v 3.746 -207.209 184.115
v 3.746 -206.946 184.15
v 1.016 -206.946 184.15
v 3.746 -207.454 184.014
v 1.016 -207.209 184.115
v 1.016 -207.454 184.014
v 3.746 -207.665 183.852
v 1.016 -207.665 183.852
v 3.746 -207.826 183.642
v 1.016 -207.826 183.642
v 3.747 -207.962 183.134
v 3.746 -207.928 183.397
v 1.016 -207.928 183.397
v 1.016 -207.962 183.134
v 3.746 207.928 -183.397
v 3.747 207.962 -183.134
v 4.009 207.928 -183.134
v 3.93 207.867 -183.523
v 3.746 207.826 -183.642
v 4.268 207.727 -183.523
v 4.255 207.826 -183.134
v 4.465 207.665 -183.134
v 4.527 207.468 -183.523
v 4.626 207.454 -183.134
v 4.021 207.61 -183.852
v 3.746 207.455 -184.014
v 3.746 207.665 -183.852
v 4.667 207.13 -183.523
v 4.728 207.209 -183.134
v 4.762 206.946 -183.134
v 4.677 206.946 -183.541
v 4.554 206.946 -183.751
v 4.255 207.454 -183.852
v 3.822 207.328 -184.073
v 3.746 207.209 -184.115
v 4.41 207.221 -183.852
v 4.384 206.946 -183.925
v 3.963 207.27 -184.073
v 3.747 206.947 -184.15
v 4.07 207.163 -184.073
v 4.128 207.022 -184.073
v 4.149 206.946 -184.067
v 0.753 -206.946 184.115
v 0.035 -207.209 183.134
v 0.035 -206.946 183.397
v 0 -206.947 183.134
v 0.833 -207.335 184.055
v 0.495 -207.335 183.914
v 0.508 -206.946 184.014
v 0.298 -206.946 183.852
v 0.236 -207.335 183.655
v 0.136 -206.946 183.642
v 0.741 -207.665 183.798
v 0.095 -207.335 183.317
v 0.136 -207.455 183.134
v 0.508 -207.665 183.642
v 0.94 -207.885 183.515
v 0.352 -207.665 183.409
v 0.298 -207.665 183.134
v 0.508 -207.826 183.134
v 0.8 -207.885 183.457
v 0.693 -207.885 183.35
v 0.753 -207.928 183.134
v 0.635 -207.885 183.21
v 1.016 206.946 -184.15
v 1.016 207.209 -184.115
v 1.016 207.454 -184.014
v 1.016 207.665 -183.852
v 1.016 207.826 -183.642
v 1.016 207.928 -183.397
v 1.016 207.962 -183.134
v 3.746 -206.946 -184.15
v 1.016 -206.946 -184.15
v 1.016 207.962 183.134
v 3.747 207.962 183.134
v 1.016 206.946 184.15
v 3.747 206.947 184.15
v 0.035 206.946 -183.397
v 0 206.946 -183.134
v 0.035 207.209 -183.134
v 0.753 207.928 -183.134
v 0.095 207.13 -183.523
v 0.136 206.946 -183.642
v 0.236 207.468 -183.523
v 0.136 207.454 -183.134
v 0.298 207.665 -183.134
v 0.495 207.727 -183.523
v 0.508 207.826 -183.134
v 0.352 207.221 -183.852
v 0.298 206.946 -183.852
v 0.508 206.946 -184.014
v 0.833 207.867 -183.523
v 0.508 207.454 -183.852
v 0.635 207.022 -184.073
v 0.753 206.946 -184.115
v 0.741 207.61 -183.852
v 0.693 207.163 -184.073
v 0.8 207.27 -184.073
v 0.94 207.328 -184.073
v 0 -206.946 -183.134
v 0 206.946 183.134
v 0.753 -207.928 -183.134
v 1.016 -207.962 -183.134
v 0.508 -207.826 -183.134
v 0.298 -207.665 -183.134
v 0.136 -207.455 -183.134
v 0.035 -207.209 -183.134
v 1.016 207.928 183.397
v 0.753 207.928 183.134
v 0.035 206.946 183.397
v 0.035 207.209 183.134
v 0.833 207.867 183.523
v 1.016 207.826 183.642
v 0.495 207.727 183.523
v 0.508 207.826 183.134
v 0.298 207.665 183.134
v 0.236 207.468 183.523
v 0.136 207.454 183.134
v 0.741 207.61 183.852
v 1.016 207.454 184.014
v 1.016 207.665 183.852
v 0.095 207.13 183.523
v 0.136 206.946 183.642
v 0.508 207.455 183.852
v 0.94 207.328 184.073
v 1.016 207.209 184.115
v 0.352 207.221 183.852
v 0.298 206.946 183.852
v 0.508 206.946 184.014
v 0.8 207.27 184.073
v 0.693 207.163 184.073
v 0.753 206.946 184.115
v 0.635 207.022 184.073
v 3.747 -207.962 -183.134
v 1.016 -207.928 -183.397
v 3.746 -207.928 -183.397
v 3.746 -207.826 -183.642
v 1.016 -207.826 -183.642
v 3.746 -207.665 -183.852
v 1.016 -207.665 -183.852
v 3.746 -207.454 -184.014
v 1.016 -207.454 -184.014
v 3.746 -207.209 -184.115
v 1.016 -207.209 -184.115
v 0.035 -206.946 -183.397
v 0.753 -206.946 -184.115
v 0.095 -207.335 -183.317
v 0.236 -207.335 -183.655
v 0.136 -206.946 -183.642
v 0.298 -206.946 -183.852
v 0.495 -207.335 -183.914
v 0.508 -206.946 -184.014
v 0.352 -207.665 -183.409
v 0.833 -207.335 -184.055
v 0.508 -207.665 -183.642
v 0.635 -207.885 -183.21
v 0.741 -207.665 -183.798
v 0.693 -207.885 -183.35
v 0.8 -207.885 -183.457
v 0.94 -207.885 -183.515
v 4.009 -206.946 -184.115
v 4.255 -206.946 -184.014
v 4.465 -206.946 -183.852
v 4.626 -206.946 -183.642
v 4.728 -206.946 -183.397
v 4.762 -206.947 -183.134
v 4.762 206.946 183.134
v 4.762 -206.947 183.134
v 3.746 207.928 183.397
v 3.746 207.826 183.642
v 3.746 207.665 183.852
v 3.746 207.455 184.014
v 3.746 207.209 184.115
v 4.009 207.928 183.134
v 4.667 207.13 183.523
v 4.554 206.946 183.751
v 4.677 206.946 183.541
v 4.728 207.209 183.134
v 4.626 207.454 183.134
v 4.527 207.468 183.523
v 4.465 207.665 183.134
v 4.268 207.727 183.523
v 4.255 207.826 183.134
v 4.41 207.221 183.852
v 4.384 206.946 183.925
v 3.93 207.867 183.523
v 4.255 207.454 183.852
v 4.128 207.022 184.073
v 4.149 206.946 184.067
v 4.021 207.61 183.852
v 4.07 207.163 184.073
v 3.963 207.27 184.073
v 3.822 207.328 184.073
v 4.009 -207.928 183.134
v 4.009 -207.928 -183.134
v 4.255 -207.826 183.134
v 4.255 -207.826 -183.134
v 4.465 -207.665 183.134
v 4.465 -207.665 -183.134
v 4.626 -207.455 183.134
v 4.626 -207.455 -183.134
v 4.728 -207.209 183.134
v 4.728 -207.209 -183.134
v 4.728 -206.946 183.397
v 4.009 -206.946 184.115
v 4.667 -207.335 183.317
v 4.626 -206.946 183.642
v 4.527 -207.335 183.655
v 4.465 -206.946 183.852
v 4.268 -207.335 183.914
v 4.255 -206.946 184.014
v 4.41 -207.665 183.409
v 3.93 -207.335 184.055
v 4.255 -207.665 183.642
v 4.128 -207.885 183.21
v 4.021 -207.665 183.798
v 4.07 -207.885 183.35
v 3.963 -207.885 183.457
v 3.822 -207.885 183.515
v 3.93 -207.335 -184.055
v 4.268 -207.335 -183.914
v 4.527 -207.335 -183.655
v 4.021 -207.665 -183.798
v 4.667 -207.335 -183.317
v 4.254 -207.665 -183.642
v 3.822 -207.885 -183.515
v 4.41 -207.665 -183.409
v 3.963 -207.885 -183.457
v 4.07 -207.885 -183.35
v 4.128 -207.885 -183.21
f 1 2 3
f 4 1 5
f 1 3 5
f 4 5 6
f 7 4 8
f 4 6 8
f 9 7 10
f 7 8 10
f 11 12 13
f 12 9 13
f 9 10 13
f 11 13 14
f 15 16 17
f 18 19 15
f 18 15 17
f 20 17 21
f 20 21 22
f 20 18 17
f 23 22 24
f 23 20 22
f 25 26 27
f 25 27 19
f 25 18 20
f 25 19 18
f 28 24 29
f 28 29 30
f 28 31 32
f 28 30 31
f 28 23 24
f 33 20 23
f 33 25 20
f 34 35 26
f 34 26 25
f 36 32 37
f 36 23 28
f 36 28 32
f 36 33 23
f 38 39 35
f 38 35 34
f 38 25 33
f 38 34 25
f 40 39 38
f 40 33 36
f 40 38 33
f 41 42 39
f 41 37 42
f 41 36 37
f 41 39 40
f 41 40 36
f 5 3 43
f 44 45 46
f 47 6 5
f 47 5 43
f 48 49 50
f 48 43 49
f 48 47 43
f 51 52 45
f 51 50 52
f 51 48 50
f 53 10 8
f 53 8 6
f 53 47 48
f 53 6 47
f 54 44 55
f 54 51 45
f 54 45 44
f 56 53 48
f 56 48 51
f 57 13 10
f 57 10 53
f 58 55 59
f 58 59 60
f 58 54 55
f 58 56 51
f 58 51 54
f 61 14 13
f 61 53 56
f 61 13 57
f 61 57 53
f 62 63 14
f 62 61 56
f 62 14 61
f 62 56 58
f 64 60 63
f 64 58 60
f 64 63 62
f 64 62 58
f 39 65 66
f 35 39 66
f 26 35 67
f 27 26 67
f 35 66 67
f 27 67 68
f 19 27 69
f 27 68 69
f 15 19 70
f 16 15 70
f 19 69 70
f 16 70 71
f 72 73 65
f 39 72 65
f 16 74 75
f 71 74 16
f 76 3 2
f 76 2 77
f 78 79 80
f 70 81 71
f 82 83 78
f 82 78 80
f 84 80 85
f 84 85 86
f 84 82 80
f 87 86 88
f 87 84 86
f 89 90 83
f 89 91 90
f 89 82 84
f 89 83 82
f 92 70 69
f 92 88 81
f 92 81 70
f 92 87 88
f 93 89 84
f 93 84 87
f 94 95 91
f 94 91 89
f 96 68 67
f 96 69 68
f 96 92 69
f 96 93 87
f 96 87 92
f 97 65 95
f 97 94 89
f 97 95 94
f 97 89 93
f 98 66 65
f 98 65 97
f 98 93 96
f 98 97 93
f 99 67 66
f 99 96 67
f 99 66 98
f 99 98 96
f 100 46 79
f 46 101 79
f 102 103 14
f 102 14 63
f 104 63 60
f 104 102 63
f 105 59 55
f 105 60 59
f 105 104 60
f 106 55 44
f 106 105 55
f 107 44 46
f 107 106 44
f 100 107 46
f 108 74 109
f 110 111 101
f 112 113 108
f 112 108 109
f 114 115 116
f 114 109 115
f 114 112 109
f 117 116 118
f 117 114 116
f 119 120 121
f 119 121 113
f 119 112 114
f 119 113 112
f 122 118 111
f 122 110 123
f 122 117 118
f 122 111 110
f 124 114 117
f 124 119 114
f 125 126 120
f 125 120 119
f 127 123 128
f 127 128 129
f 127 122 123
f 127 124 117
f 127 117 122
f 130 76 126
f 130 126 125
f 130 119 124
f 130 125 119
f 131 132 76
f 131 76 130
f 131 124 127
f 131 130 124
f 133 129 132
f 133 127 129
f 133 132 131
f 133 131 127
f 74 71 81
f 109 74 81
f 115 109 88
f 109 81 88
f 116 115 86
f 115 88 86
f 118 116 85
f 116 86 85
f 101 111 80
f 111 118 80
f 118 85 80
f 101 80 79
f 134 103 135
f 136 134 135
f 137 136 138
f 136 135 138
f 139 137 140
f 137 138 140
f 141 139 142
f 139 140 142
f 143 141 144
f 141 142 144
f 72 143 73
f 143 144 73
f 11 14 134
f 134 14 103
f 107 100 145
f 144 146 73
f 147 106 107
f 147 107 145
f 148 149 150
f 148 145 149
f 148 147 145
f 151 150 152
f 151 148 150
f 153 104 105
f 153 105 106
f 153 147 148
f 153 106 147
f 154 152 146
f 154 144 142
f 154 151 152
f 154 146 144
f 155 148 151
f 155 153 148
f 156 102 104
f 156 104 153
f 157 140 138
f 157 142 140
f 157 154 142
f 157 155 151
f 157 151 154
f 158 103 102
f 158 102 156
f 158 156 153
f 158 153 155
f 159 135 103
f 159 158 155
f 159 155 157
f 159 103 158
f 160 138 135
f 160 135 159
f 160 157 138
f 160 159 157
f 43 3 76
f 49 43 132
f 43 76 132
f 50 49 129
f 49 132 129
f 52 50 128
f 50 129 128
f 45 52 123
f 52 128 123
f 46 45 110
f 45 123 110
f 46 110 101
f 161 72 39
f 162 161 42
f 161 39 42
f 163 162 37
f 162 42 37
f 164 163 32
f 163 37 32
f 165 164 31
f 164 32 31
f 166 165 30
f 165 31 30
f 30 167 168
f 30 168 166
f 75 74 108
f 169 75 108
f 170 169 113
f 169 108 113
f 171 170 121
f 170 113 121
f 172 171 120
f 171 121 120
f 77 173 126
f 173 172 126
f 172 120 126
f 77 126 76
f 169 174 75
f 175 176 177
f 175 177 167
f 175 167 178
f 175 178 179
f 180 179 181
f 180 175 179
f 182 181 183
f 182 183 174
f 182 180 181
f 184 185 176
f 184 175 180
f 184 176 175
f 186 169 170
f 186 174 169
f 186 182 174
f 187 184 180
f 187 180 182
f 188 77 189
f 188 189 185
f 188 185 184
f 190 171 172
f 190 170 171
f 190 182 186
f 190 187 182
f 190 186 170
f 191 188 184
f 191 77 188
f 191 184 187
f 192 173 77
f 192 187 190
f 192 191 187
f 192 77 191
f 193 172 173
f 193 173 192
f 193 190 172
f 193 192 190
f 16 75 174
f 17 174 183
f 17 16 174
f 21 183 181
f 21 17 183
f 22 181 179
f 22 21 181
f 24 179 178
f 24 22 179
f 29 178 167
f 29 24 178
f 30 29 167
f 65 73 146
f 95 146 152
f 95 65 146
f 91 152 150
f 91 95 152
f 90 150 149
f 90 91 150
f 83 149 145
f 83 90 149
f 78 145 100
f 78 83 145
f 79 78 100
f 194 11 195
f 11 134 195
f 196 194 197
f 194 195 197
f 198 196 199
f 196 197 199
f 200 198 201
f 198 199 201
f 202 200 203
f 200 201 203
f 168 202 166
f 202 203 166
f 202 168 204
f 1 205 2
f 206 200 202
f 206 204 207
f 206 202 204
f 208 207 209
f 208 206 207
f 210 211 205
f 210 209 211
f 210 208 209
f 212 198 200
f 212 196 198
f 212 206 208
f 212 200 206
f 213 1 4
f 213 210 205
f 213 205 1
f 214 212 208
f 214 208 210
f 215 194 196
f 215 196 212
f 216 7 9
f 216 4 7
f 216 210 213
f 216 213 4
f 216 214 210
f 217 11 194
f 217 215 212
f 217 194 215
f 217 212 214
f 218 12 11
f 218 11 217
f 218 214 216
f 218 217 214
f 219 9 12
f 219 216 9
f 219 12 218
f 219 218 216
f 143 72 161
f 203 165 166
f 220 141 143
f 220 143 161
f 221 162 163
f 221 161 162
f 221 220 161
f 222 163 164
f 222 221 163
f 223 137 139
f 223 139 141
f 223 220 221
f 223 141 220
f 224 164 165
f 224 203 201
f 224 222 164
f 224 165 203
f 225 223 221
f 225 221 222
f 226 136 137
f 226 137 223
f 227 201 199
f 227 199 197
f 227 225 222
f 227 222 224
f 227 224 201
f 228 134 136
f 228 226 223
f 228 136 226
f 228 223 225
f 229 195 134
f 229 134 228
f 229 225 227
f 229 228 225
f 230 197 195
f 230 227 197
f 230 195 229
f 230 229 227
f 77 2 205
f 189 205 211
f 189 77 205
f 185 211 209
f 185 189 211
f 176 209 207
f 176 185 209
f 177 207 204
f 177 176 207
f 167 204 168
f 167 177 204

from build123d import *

# Parameters (mm, degrees)
SKETCH1_W           = 368.3
SKETCH1_H           = 415.925
BOSS_EXTRUDE1_DEPTH = 4.7625
FILLET1_R           = 1.016
FILLET2_R           = 1.016


with BuildPart() as part:
    # Sketch1 → Boss-Extrude1 (new body)
    with BuildSketch(Plane(origin=(0, 0, 0), x_dir=(0, 0, -1), z_dir=(1, 0, 0))):
        Rectangle(SKETCH1_W, SKETCH1_H)
    extrude(amount=BOSS_EXTRUDE1_DEPTH)

    # Fillet1
    fillet1_edges = [part.edges().sort_by_distance(p)[0] for p in [
        (4.7625, 0, 184.15),
        (4.7625, -207.9625, 0),
        (4.7625, 0, -184.15),
        (0, -207.9625, 0),
        (0, 0, 184.15),
        (0, 207.9625, 0),
        (0, 0, -184.15),
        (4.7625, 207.9625, 0),
    ]]
    fillet(fillet1_edges, radius=FILLET1_R)

    # Fillet2
    # the kernel refuses this fillet: 1.016 mm, written as the material it takes off along each edge
    with BuildSketch(Plane(origin=(1.016, -206.9465, -183.134), x_dir=(0, 0, -1), z_dir=(0, -1, 0))) as fillet2_piece_1_section:
        Polygon((0, 0), (FILLET2_R, 0), (FILLET2_R, -FILLET2_R), (0, -FILLET2_R), align=None)
    fillet2_piece_1 = extrude(amount=FILLET2_R, mode=Mode.PRIVATE)
    fillet2_piece_1 = fillet2_piece_1 - Plane(origin=(1.016, -206.9465, -183.134), x_dir=(0.7071067811865475, 0, 0.7071067811865475), z_dir=(0, -1, 0)) * Sphere(FILLET2_R, mode=Mode.PRIVATE)
    add(fillet2_piece_1, mode=Mode.SUBTRACT)
    with BuildSketch(Plane(origin=(1.016, -206.9465, 183.134), x_dir=(0, 0, 1), z_dir=(0, -1, 0))) as fillet2_piece_2_section:
        Polygon((0, 0), (FILLET2_R, 0), (FILLET2_R, FILLET2_R), (0, FILLET2_R), align=None)
    fillet2_piece_2 = extrude(amount=FILLET2_R, mode=Mode.PRIVATE)
    fillet2_piece_2 = fillet2_piece_2 - Plane(origin=(1.016, -206.9465, 183.134), x_dir=(0.7071067811865475, 0, -0.7071067811865475), z_dir=(0, -1, 0)) * Sphere(FILLET2_R, mode=Mode.PRIVATE)
    add(fillet2_piece_2, mode=Mode.SUBTRACT)
    with BuildSketch(Plane(origin=(1.016, 206.9465, -183.134), x_dir=(0, 1, 0), z_dir=(0, 0, -1))) as fillet2_piece_3_section:
        Polygon((0, 0), (FILLET2_R, 0), (FILLET2_R, -FILLET2_R), (0, -FILLET2_R), align=None)
    fillet2_piece_3 = extrude(amount=FILLET2_R, mode=Mode.PRIVATE)
    fillet2_piece_3 = fillet2_piece_3 - Plane(origin=(1.016, 206.9465, -183.134), x_dir=(0.7071067811865475, -0.7071067811865475, 0), z_dir=(0, 0, -1)) * Sphere(FILLET2_R, mode=Mode.PRIVATE)
    add(fillet2_piece_3, mode=Mode.SUBTRACT)
    with BuildSketch(Plane(origin=(1.016, 206.9465, 183.134), x_dir=(0, 1, 0), z_dir=(0, 0, 1))) as fillet2_piece_4_section:
        Polygon((0, 0), (FILLET2_R, 0), (FILLET2_R, FILLET2_R), (0, FILLET2_R), align=None)
    fillet2_piece_4 = extrude(amount=FILLET2_R, mode=Mode.PRIVATE)
    fillet2_piece_4 = fillet2_piece_4 - Plane(origin=(1.016, 206.9465, 183.134), x_dir=(0.7071067811865475, -0.7071067811865475, 0), z_dir=(0, 0, 1)) * Sphere(FILLET2_R, mode=Mode.PRIVATE)
    add(fillet2_piece_4, mode=Mode.SUBTRACT)
    with BuildSketch(Plane(origin=(3.7465, 206.9465, 183.134), x_dir=(0, 1, 0), z_dir=(0, 0, 1))) as fillet2_piece_5_section:
        Polygon((0, 0), (FILLET2_R, 0), (FILLET2_R, -FILLET2_R), (0, -FILLET2_R), align=None)
    fillet2_piece_5 = extrude(amount=FILLET2_R, mode=Mode.PRIVATE)
    fillet2_piece_5 = fillet2_piece_5 - Plane(origin=(3.7465, 206.9465, 183.134), x_dir=(-0.7071067811865475, -0.7071067811865475, 0), z_dir=(0, 0, 1)) * Sphere(FILLET2_R, mode=Mode.PRIVATE)
    add(fillet2_piece_5, mode=Mode.SUBTRACT)
    with BuildSketch(Plane(origin=(3.7465, 206.9465, -183.134), x_dir=(0, 1, 0), z_dir=(0, 0, -1))) as fillet2_piece_6_section:
        Polygon((0, 0), (FILLET2_R, 0), (FILLET2_R, FILLET2_R), (0, FILLET2_R), align=None)
    fillet2_piece_6 = extrude(amount=FILLET2_R, mode=Mode.PRIVATE)
    fillet2_piece_6 = fillet2_piece_6 - Plane(origin=(3.7465, 206.9465, -183.134), x_dir=(-0.7071067811865475, -0.7071067811865475, 0), z_dir=(0, 0, -1)) * Sphere(FILLET2_R, mode=Mode.PRIVATE)
    add(fillet2_piece_6, mode=Mode.SUBTRACT)
    with BuildSketch(Plane(origin=(3.7465, -206.9465, 183.134), x_dir=(0, 0, 1), z_dir=(0, -1, 0))) as fillet2_piece_7_section:
        Polygon((0, 0), (FILLET2_R, 0), (FILLET2_R, -FILLET2_R), (0, -FILLET2_R), align=None)
    fillet2_piece_7 = extrude(amount=FILLET2_R, mode=Mode.PRIVATE)
    fillet2_piece_7 = fillet2_piece_7 - Plane(origin=(3.7465, -206.9465, 183.134), x_dir=(-0.7071067811865475, 0, -0.7071067811865475), z_dir=(0, -1, 0)) * Sphere(FILLET2_R, mode=Mode.PRIVATE)
    add(fillet2_piece_7, mode=Mode.SUBTRACT)
    with BuildSketch(Plane(origin=(3.7465, -206.9465, -183.134), x_dir=(0, 0, -1), z_dir=(0, -1, 0))) as fillet2_piece_8_section:
        Polygon((0, 0), (FILLET2_R, 0), (FILLET2_R, FILLET2_R), (0, FILLET2_R), align=None)
    fillet2_piece_8 = extrude(amount=FILLET2_R, mode=Mode.PRIVATE)
    fillet2_piece_8 = fillet2_piece_8 - Plane(origin=(3.7465, -206.9465, -183.134), x_dir=(-0.7071067811865475, 0, 0.7071067811865475), z_dir=(0, -1, 0)) * Sphere(FILLET2_R, mode=Mode.PRIVATE)
    add(fillet2_piece_8, mode=Mode.SUBTRACT)
    with BuildSketch(Plane(origin=(1.016, 207.9625, 184.15), x_dir=(0, -1, 0), z_dir=(1, 0, 0)), Plane(origin=(1.016, -207.9625, 184.15), x_dir=(0, 0, -1), z_dir=(1, 0, 0))) as fillet2_piece_9:
        with BuildLine():
            CenterArc((FILLET2_R, FILLET2_R), FILLET2_R, 180, 90)
            Line((0, FILLET2_R), (0, 0))
            Line((0, 0), (FILLET2_R, 0))
        make_face()
    extrude(amount=2.7305, mode=Mode.SUBTRACT)
    with BuildSketch(Plane(origin=(1.016, 207.9625, -184.15), x_dir=(0, -1, 0), z_dir=(1, 0, 0)), Plane(origin=(1.016, -207.9625, -184.15), x_dir=(0, 0, 1), z_dir=(1, 0, 0))) as fillet2_piece_10:
        with BuildLine():
            CenterArc((FILLET2_R, -FILLET2_R), FILLET2_R, 90, 90)
            Line((0, -FILLET2_R), (0, 0))
            Line((0, 0), (FILLET2_R, 0))
        make_face()
    extrude(amount=2.7305, mode=Mode.SUBTRACT)


solid = part.part
